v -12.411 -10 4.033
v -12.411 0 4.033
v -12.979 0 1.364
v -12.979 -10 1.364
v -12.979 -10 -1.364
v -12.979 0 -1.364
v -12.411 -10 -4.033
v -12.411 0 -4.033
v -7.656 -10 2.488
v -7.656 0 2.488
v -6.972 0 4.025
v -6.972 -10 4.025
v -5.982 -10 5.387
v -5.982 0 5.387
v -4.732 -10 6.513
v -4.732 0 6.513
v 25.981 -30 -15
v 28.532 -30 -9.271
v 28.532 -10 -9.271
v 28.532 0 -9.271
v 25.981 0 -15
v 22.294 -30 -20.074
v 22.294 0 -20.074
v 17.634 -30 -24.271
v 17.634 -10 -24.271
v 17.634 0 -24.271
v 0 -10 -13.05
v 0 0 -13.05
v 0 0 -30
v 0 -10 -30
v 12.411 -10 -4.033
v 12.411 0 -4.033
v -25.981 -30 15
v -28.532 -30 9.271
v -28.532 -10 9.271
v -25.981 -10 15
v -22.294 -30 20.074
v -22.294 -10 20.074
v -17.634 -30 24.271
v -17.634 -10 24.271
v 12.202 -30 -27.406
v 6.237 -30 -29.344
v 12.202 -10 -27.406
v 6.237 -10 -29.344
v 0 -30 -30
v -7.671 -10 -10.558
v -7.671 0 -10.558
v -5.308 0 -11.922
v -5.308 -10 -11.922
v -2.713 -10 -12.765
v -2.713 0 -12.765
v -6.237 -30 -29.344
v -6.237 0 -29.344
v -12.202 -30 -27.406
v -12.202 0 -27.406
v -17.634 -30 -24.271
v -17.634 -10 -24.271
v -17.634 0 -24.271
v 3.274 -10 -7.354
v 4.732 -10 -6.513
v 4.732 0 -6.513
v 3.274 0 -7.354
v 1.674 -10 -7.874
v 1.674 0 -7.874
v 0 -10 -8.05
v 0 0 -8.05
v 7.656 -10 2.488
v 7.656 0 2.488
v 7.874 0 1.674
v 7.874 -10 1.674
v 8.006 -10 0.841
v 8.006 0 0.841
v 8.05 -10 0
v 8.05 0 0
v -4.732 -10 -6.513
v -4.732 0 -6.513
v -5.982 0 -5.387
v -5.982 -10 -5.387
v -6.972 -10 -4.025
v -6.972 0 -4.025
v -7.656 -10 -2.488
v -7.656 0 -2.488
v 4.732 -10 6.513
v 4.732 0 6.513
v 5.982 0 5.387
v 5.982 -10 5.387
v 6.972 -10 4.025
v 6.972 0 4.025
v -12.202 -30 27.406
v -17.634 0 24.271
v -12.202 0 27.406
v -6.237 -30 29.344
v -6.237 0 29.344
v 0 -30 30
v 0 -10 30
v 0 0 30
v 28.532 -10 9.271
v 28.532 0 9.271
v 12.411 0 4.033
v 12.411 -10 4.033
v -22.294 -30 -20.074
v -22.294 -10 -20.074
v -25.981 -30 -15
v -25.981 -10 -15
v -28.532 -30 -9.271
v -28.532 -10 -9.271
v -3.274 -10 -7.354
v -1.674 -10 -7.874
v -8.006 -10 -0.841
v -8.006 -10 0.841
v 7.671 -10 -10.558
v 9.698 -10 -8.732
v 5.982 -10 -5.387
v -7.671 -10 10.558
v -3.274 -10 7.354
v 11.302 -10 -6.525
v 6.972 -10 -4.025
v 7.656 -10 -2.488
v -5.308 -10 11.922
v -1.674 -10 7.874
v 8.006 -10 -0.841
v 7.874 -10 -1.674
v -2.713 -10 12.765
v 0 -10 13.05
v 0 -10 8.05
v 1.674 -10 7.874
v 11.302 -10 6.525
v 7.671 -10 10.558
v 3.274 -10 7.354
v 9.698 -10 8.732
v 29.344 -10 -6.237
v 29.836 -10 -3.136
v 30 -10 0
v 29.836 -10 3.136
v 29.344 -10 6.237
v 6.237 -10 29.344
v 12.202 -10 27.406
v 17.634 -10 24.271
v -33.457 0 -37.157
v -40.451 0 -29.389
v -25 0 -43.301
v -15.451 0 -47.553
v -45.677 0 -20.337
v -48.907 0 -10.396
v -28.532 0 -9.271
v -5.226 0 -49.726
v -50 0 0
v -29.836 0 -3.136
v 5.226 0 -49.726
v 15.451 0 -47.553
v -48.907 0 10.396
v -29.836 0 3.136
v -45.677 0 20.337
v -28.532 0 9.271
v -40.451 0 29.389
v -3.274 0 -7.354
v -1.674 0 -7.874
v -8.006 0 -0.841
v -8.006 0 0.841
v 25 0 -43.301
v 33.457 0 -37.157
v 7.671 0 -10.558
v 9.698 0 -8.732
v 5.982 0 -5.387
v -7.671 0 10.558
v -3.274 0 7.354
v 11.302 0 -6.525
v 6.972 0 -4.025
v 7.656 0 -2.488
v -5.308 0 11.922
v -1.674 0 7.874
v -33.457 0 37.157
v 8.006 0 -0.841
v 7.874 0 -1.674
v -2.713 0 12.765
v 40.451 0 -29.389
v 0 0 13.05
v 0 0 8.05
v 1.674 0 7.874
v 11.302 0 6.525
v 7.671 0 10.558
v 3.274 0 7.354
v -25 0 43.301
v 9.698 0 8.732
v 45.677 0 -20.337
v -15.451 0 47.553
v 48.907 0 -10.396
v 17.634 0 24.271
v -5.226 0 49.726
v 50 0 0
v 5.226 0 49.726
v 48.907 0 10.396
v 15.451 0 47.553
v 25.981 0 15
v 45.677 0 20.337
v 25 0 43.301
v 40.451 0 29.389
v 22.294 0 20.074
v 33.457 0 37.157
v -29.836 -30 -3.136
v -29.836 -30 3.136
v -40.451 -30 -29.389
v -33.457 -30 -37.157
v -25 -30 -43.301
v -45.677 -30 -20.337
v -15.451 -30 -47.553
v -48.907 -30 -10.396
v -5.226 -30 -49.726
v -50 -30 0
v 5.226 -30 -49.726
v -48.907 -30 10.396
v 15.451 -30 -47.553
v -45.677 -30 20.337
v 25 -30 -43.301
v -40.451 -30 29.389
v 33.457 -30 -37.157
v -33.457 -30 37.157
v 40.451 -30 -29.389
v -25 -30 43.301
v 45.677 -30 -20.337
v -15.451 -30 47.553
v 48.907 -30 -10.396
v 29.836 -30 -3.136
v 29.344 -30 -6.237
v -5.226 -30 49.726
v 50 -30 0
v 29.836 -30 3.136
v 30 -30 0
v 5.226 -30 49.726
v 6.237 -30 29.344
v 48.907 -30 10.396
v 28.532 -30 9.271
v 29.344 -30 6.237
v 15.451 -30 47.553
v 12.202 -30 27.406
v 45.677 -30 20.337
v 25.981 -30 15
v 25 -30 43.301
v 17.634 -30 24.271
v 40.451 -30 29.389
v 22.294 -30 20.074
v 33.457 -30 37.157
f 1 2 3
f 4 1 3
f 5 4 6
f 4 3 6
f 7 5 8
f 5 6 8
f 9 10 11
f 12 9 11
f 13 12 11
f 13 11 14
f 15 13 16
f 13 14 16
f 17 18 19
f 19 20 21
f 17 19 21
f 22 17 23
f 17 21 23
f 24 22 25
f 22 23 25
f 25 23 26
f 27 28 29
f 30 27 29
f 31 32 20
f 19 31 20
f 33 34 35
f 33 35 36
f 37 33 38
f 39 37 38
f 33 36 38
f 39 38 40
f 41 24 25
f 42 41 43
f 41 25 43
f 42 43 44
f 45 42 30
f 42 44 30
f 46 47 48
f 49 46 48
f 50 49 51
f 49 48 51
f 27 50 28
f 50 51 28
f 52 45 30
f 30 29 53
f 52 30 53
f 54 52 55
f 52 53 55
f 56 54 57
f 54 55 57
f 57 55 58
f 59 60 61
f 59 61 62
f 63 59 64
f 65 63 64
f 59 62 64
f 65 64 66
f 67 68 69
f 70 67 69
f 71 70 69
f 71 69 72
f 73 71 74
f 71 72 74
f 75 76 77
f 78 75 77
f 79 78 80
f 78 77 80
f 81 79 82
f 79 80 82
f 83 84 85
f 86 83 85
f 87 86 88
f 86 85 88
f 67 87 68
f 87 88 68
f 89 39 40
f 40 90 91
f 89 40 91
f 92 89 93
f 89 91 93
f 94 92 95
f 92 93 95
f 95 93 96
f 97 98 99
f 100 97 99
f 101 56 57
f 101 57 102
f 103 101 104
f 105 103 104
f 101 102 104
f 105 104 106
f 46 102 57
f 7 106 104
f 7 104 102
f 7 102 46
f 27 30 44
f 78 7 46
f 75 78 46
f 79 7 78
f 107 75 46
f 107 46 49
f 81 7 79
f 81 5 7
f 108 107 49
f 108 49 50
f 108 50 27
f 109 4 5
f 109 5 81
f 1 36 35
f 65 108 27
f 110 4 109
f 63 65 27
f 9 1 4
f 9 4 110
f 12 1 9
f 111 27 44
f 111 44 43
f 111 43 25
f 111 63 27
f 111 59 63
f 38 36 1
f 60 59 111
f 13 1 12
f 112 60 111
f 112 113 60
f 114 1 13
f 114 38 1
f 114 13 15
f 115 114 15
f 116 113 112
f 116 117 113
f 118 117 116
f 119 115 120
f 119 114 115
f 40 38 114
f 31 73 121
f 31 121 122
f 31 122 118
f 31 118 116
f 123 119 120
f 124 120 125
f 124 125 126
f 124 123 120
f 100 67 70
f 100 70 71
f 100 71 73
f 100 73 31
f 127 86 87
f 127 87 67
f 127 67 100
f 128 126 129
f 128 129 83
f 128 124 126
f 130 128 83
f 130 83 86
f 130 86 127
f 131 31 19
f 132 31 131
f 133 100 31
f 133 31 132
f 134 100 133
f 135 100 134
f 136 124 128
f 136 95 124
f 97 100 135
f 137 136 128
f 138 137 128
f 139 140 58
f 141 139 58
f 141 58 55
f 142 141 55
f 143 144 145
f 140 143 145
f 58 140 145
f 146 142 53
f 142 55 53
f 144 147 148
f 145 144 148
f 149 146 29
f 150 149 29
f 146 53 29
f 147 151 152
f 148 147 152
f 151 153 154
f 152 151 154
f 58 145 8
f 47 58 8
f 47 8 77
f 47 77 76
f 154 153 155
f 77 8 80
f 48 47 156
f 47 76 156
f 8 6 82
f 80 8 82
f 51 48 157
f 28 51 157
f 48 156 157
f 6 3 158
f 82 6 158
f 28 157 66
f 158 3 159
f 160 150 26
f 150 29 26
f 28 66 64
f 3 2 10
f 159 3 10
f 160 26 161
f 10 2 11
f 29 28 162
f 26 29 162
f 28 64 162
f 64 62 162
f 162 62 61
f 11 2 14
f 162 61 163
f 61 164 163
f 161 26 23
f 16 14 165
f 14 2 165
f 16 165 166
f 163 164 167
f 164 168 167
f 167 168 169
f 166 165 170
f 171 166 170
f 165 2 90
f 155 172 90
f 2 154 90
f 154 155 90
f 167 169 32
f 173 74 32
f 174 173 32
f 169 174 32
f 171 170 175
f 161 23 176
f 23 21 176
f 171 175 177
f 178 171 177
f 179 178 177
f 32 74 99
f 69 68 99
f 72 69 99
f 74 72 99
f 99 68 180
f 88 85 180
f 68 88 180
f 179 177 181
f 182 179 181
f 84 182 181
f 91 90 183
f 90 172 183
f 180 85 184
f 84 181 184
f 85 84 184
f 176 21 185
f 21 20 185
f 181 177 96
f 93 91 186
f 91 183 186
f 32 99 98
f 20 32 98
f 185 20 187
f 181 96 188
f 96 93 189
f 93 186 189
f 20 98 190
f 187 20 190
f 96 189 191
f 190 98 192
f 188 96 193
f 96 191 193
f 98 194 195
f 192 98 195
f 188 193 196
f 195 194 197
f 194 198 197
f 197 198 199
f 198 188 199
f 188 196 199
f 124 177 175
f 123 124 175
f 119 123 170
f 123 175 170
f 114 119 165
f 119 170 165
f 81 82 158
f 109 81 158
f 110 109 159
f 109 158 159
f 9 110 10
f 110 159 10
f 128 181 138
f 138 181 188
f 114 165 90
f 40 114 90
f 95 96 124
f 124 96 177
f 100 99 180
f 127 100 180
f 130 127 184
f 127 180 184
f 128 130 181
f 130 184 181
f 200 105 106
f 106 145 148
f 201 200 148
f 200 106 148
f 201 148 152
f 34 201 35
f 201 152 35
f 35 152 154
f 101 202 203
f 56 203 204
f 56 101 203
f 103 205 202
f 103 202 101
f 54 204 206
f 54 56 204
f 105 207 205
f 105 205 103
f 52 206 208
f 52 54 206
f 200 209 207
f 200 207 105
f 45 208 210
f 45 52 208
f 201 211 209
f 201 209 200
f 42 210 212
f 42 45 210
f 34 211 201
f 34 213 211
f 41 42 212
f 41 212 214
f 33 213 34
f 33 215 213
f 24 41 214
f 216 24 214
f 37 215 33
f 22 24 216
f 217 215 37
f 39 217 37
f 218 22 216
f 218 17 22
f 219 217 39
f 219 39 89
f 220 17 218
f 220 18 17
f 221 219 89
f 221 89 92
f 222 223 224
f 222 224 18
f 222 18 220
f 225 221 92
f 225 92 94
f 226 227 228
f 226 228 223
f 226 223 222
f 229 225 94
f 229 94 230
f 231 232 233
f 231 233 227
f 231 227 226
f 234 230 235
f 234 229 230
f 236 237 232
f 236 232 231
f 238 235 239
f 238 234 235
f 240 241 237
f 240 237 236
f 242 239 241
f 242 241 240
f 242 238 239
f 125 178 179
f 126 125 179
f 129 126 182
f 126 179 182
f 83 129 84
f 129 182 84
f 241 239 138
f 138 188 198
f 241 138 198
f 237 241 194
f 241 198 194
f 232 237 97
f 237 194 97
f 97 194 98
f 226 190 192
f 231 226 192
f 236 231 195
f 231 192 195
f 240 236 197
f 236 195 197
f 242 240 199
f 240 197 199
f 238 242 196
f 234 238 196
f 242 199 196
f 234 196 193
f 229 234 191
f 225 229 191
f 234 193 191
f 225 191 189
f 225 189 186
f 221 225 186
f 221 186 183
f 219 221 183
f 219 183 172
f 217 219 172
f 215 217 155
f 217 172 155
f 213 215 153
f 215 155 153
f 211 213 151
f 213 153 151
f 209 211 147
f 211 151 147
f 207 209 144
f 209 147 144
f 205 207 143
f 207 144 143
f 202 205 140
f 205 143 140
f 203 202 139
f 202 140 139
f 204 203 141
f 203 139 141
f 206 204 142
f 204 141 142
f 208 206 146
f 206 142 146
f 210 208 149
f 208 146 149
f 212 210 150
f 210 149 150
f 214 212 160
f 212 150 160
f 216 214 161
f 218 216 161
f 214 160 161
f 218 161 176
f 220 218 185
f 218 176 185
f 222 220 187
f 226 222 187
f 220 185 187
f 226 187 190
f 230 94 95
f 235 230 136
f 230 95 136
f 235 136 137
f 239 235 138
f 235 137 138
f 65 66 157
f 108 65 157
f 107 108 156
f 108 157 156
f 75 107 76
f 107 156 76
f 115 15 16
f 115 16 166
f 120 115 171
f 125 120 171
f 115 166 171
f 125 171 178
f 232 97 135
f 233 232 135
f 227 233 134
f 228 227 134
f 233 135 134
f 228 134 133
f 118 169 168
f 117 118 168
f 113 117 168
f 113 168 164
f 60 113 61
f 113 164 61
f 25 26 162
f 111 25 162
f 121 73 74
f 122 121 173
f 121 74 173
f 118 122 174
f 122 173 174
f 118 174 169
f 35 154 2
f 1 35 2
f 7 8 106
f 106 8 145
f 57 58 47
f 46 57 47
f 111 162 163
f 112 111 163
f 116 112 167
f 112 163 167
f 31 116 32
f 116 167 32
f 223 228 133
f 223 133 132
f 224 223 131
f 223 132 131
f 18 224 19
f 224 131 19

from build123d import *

# Parameters (mm, degrees)
F0_R     = 50
F1_DEPTH = 30
F2_DEPTH = 10


with BuildPart() as f1:
    # F0 (on Front) → F1 (new body)
    with BuildSketch(Plane.XZ):
        Circle(F0_R)
        with BuildLine():
            ThreePointArc((28.5316954889, 9.2705098312), (29.6306502179, 4.6930339512), (30, 0))
            ThreePointArc((30, 0), (29.6306502179, -4.6930339512), (28.5316954889, -9.2705098312))
            ThreePointArc((28.5316954889, -9.2705098312), (24.2705098312, -17.6335575688), (17.6335575688, -24.2705098312))
            ThreePointArc((17.6335575688, -24.2705098312), (9.2705098312, -28.5316954889), (0, -30))
            ThreePointArc((0, -30), (-9.2705098312, -28.5316954889), (-17.6335575688, -24.2705098312))
            ThreePointArc((-17.6335575688, -24.2705098312), (-24.2705098312, -17.6335575688), (-28.5316954889, -9.2705098312))
            ThreePointArc((-28.5316954889, -9.2705098312), (-30, 0), (-28.5316954889, 9.2705098312))
            ThreePointArc((-28.5316954889, 9.2705098312), (-24.2705098312, 17.6335575688), (-17.6335575688, 24.2705098312))
            ThreePointArc((-17.6335575688, 24.2705098312), (-9.2705098312, 28.5316954889), (0, 30))
            ThreePointArc((0, 30), (9.2705098312, 28.5316954889), (17.6335575688, 24.2705098312))
            ThreePointArc((17.6335575688, 24.2705098312), (24.2705098312, 17.6335575688), (28.5316954889, 9.2705098312))
        make_face(mode=Mode.SUBTRACT)
    extrude(amount=F1_DEPTH)

    # F0 (on Front) → F2 (join)
    with BuildSketch(Plane.XZ):
        with BuildLine():
            Line((-7.6705975424, 10.5576717766), (-17.6335575688, 24.2705098312))
            ThreePointArc((-17.6335575688, 24.2705098312), (-24.2705098312, 17.6335575688), (-28.5316954889, 9.2705098312))
            Line((-28.5316954889, 9.2705098312), (-12.4112875377, 4.0326717766))
            ThreePointArc((-12.4112875377, 4.0326717766), (-10.5576717766, 7.6705975424), (-7.6705975424, 10.5576717766))
        make_face()
        with BuildLine():
            Line((-4.731671281, 6.5125868047), (-7.6705975424, 10.5576717766))
            ThreePointArc((-7.6705975424, 10.5576717766), (-10.5576717766, 7.6705975424), (-12.4112875377, 4.0326717766))
            Line((-12.4112875377, 4.0326717766), (-7.6560049562, 2.4875868047))
            ThreePointArc((-7.6560049562, 2.4875868047), (-6.5125868047, 4.731671281), (-4.731671281, 6.5125868047))
        make_face()
        with BuildLine():
            Line((0, 8.05), (0, 13.05))
            ThreePointArc((0, 13.05), (-4.0326717766, 12.4112875377), (-7.6705975424, 10.5576717766))
            Line((-7.6705975424, 10.5576717766), (-4.731671281, 6.5125868047))
            ThreePointArc((-4.731671281, 6.5125868047), (-2.4875868047, 7.6560049562), (0, 8.05))
        make_face()
        with BuildLine():
            Line((4.731671281, 6.5125868047), (7.6705975424, 10.5576717766))
            ThreePointArc((7.6705975424, 10.5576717766), (4.0326717766, 12.4112875377), (0, 13.05))
            Line((0, 13.05), (0, 8.05))
            ThreePointArc((0, 8.05), (2.4875868047, 7.6560049562), (4.731671281, 6.5125868047))
        make_face()
        with BuildLine():
            Line((7.6560049562, 2.4875868047), (12.4112875377, 4.0326717766))
            ThreePointArc((12.4112875377, 4.0326717766), (10.5576717766, 7.6705975424), (7.6705975424, 10.5576717766))
            Line((7.6705975424, 10.5576717766), (4.731671281, 6.5125868047))
            ThreePointArc((4.731671281, 6.5125868047), (6.5125868047, 4.731671281), (7.6560049562, 2.4875868047))
        make_face()
        with BuildLine():
            ThreePointArc((13.05, 0), (12.8893328448, 2.0414697688), (12.4112875377, 4.0326717766))
            Line((12.4112875377, 4.0326717766), (7.6560049562, 2.4875868047))
            ThreePointArc((7.6560049562, 2.4875868047), (7.9508911418, 1.2592974436), (8.05, 0))
            ThreePointArc((8.05, 0), (7.9508911418, -1.2592974436), (7.6560049562, -2.4875868047))
            Line((7.6560049562, -2.4875868047), (12.4112875377, -4.0326717766))
            ThreePointArc((12.4112875377, -4.0326717766), (12.8893328448, -2.0414697688), (13.05, 0))
        make_face()
        with BuildLine():
            ThreePointArc((7.6705975424, -10.5576717766), (10.5576717766, -7.6705975424), (12.4112875377, -4.0326717766))
            Line((12.4112875377, -4.0326717766), (7.6560049562, -2.4875868047))
            ThreePointArc((7.6560049562, -2.4875868047), (6.5125868047, -4.731671281), (4.731671281, -6.5125868047))
            Line((4.731671281, -6.5125868047), (7.6705975424, -10.5576717766))
        make_face()
        with BuildLine():
            ThreePointArc((0, -13.05), (4.0326717766, -12.4112875377), (7.6705975424, -10.5576717766))
            Line((7.6705975424, -10.5576717766), (4.731671281, -6.5125868047))
            ThreePointArc((4.731671281, -6.5125868047), (2.4875868047, -7.6560049562), (0, -8.05))
            Line((0, -8.05), (0, -13.05))
        make_face()
        with BuildLine():
            ThreePointArc((-7.6705975424, -10.5576717766), (-4.0326717766, -12.4112875377), (0, -13.05))
            Line((0, -13.05), (0, -8.05))
            ThreePointArc((0, -8.05), (-2.4875868047, -7.6560049562), (-4.731671281, -6.5125868047))
            Line((-4.731671281, -6.5125868047), (-7.6705975424, -10.5576717766))
        make_face()
        with BuildLine():
            ThreePointArc((-12.4112875377, -4.0326717766), (-10.5576717766, -7.6705975424), (-7.6705975424, -10.5576717766))
            Line((-7.6705975424, -10.5576717766), (-4.731671281, -6.5125868047))
            ThreePointArc((-4.731671281, -6.5125868047), (-6.5125868047, -4.731671281), (-7.6560049562, -2.4875868047))
            Line((-7.6560049562, -2.4875868047), (-12.4112875377, -4.0326717766))
        make_face()
        with BuildLine():
            Line((-7.6560049562, 2.4875868047), (-12.4112875377, 4.0326717766))
            ThreePointArc((-12.4112875377, 4.0326717766), (-13.05, 0), (-12.4112875377, -4.0326717766))
            Line((-12.4112875377, -4.0326717766), (-7.6560049562, -2.4875868047))
            ThreePointArc((-7.6560049562, -2.4875868047), (-8.05, 0), (-7.6560049562, 2.4875868047))
        make_face()
        with BuildLine():
            ThreePointArc((-28.5316954889, -9.2705098312), (-24.2705098312, -17.6335575688), (-17.6335575688, -24.2705098312))
            Line((-17.6335575688, -24.2705098312), (-7.6705975424, -10.5576717766))
            ThreePointArc((-7.6705975424, -10.5576717766), (-10.5576717766, -7.6705975424), (-12.4112875377, -4.0326717766))
            Line((-12.4112875377, -4.0326717766), (-28.5316954889, -9.2705098312))
        make_face()
        with BuildLine():
            ThreePointArc((0, -30), (9.2705098312, -28.5316954889), (17.6335575688, -24.2705098312))
            Line((17.6335575688, -24.2705098312), (7.6705975424, -10.5576717766))
            ThreePointArc((7.6705975424, -10.5576717766), (4.0326717766, -12.4112875377), (0, -13.05))
            Line((0, -13.05), (0, -30))
        make_face()
        with BuildLine():
            ThreePointArc((28.5316954889, -9.2705098312), (29.6306502179, -4.6930339512), (30, 0))
            ThreePointArc((30, 0), (29.6306502179, 4.6930339512), (28.5316954889, 9.2705098312))
            Line((28.5316954889, 9.2705098312), (12.4112875377, 4.0326717766))
            ThreePointArc((12.4112875377, 4.0326717766), (12.8893328448, 2.0414697688), (13.05, 0))
            ThreePointArc((13.05, 0), (12.8893328448, -2.0414697688), (12.4112875377, -4.0326717766))
            Line((12.4112875377, -4.0326717766), (28.5316954889, -9.2705098312))
        make_face()
        with BuildLine():
            Line((7.6705975424, 10.5576717766), (17.6335575688, 24.2705098312))
            ThreePointArc((17.6335575688, 24.2705098312), (9.2705098312, 28.5316954889), (0, 30))
            Line((0, 30), (0, 13.05))
            ThreePointArc((0, 13.05), (4.0326717766, 12.4112875377), (7.6705975424, 10.5576717766))
        make_face()
    extrude(amount=F2_DEPTH)


solid = f1.part
